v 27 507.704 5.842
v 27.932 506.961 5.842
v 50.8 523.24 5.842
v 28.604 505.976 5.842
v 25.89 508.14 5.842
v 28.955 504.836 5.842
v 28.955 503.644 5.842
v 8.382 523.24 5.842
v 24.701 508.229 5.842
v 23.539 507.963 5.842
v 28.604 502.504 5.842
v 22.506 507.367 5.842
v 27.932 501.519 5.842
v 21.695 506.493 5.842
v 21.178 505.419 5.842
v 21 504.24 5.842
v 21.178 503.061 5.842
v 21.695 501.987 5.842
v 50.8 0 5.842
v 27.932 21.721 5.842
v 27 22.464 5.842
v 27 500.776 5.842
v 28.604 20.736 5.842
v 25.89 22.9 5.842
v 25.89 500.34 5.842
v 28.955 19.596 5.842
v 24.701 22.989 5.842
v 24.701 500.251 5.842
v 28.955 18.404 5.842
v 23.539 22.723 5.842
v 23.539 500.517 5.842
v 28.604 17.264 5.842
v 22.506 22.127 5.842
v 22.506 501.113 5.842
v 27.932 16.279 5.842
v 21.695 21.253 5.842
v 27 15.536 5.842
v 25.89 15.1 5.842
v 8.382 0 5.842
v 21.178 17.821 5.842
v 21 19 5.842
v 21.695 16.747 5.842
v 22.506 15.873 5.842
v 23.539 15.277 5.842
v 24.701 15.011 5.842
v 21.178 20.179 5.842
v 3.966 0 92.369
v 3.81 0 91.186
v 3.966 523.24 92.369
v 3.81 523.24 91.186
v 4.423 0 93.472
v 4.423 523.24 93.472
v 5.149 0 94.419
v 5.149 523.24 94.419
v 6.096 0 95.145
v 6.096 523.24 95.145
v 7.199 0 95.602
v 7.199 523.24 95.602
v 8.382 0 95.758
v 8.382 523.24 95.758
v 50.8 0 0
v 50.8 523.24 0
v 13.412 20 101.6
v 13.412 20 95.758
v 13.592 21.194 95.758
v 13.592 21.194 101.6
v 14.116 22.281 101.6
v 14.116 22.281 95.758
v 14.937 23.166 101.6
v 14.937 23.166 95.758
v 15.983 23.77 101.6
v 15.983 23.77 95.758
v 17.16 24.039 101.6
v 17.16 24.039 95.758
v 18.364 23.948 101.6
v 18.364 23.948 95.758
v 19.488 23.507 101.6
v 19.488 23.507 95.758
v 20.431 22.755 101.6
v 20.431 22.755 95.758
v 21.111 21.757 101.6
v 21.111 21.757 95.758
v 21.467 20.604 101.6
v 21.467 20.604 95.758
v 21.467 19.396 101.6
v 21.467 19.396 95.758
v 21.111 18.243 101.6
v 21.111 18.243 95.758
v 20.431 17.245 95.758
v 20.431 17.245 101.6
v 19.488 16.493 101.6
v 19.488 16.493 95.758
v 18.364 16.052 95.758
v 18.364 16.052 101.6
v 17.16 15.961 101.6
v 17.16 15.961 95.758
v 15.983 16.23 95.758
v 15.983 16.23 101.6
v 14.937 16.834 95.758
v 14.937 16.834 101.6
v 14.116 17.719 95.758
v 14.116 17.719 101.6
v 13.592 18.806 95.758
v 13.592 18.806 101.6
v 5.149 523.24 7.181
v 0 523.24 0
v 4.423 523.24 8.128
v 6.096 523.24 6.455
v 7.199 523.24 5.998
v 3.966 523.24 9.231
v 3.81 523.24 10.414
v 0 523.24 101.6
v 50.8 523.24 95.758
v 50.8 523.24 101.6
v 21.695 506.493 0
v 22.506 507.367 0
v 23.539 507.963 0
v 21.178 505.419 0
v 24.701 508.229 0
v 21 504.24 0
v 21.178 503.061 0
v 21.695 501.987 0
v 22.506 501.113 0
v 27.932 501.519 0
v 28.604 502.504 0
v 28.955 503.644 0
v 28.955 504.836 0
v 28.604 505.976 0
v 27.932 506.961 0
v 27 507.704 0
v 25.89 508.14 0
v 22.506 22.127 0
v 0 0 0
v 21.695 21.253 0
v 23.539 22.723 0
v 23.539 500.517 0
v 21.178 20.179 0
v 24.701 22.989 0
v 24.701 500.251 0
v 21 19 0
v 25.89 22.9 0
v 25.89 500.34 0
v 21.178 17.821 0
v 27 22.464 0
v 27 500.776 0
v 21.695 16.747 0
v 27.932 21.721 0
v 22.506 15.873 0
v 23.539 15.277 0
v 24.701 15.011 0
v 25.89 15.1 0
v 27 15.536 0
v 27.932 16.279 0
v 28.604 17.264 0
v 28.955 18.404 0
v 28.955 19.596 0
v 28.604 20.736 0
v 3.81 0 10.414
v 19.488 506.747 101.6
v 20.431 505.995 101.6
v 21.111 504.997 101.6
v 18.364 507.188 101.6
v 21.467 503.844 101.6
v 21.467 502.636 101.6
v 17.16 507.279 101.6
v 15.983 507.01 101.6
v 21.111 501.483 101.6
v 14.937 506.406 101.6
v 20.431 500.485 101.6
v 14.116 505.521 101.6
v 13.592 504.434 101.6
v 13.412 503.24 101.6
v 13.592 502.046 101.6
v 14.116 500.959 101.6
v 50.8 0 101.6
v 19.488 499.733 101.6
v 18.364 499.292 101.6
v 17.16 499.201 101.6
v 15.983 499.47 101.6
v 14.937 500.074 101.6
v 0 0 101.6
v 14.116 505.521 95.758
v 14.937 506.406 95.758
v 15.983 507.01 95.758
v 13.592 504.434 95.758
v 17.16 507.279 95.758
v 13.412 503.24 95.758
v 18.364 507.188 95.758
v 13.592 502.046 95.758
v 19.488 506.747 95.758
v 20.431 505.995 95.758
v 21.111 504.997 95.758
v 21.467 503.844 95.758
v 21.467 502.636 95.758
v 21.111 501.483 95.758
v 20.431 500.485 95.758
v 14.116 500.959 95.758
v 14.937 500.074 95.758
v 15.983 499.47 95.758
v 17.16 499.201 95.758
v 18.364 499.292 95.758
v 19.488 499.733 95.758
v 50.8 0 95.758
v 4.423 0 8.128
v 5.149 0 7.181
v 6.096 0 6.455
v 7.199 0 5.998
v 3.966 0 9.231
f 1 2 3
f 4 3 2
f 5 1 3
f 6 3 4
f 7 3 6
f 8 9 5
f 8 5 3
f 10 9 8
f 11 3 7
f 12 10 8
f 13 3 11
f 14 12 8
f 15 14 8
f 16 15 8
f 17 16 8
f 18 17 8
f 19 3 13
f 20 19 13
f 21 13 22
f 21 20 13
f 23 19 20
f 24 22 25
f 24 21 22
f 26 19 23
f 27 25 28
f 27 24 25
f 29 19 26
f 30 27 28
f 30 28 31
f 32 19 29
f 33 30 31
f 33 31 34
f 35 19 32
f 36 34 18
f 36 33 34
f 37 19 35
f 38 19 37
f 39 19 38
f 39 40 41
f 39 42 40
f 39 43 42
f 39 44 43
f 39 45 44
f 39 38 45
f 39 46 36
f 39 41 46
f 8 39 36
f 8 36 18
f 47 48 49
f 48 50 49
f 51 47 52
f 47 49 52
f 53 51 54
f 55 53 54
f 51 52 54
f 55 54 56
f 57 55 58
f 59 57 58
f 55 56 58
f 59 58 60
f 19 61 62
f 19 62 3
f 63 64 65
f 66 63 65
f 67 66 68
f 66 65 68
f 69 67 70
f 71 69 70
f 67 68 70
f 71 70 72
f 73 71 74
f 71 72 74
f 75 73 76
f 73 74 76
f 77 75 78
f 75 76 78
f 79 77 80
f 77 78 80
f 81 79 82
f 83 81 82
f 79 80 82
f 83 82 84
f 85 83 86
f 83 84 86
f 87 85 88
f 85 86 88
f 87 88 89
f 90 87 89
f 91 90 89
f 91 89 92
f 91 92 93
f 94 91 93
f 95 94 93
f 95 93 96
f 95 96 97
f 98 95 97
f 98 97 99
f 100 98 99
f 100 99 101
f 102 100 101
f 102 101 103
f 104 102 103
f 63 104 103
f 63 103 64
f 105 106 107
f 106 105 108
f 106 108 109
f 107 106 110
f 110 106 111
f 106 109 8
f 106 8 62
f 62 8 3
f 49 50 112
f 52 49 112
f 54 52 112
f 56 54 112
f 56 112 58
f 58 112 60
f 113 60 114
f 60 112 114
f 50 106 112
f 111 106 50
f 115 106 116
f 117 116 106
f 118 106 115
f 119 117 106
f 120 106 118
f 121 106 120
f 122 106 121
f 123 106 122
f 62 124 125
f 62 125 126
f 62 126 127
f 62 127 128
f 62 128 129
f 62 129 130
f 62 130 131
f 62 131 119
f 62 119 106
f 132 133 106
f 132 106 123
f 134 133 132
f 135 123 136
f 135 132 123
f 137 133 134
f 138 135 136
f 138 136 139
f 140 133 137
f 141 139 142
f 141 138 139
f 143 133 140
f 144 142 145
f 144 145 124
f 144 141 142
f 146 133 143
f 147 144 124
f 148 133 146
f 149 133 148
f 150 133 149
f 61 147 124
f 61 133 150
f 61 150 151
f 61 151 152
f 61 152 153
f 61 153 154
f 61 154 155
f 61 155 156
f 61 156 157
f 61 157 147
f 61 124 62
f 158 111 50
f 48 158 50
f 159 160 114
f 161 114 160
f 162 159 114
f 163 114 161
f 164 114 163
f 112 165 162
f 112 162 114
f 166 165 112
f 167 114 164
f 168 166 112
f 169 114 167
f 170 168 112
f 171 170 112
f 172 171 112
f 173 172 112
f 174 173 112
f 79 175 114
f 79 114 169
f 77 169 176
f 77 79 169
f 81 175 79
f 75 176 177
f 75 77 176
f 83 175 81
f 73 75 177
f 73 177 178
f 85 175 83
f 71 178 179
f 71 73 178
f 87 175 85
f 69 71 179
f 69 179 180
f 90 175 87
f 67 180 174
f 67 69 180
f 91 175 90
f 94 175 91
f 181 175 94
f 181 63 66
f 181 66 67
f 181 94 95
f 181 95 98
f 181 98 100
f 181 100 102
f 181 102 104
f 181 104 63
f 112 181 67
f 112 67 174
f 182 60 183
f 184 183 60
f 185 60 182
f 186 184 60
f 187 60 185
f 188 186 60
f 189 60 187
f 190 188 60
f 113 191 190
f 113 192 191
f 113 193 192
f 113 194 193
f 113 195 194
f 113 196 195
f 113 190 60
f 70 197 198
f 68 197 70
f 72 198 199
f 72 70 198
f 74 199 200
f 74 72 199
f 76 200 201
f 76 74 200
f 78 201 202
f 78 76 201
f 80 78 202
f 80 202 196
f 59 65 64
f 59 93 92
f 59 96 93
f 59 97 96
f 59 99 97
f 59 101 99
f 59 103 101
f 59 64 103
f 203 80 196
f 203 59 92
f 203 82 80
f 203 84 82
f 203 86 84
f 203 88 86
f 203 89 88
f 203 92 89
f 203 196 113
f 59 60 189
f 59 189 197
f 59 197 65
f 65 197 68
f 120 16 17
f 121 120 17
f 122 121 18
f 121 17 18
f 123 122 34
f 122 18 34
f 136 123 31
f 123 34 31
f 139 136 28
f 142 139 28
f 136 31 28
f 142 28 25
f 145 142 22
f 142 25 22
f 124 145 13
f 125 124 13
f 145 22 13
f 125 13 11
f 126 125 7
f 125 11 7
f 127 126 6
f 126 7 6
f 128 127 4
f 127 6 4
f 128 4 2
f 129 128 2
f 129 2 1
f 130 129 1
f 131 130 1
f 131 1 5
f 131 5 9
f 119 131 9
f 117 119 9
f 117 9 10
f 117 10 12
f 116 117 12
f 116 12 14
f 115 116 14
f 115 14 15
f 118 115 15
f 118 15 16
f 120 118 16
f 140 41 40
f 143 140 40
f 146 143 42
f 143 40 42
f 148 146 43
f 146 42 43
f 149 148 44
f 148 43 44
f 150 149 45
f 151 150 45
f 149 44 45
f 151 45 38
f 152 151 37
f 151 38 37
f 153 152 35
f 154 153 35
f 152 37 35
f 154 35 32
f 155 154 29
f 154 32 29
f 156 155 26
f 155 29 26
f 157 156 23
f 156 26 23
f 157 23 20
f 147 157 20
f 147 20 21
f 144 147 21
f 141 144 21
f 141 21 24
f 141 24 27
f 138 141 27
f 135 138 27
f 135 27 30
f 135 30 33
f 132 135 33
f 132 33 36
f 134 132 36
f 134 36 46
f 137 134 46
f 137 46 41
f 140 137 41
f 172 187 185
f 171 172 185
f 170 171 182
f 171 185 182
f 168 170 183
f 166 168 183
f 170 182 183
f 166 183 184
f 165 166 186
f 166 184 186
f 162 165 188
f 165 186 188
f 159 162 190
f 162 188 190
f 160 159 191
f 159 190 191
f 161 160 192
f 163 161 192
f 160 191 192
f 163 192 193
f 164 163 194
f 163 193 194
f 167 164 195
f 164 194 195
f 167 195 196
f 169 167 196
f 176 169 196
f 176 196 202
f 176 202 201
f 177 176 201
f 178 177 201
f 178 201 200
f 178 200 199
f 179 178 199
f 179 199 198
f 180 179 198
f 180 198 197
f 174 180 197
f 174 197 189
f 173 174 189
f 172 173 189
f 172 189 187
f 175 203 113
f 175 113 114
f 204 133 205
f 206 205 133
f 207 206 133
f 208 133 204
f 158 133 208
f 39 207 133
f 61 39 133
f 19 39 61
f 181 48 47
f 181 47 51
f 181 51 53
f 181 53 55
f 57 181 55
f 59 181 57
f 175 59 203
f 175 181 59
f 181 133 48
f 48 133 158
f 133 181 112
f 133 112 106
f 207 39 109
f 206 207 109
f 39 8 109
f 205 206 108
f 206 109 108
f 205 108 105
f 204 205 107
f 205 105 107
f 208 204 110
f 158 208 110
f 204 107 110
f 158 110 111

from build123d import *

# Parameters (mm, degrees)
F1_DEPTH = 523.24
F2_R     = 4.572
F4_D     = 8.1
F4_DEPTH = 20
F6_D     = 8
F6_DEPTH = 10


with BuildPart() as f1:
    # F0 (on Front) → F1 (new body)
    with BuildSketch(Plane.XZ):
        Polygon((0, 101.6), (0, 0), (50.8, 0), (50.8, 5.842), (3.81, 5.842), (3.81, 95.758), (50.8, 95.758), (50.8, 101.6), align=None)
    extrude(amount=-F1_DEPTH)

    # F2
    f2_edges = [f1.edges().sort_by_distance(p)[0] for p in [
        (3.81, 261.62, 5.842),
        (3.81, 261.62, 95.758),
    ]]
    fillet(f2_edges, radius=F2_R)

    # F4
    with Locations(Plane.XY.offset(101.6)):
        with Locations((17.4625, 503.24), (17.4625, 20)):
            Hole(F4_D / 2, depth=F4_DEPTH)

    # F6
    with Locations(Plane(origin=(0, 0, 0), x_dir=(1, 0, 0), z_dir=(0, 0, -1))):
        with Locations((25, -19), (25, -504.24)):
            Hole(F6_D / 2, depth=F6_DEPTH)


solid = f1.part
